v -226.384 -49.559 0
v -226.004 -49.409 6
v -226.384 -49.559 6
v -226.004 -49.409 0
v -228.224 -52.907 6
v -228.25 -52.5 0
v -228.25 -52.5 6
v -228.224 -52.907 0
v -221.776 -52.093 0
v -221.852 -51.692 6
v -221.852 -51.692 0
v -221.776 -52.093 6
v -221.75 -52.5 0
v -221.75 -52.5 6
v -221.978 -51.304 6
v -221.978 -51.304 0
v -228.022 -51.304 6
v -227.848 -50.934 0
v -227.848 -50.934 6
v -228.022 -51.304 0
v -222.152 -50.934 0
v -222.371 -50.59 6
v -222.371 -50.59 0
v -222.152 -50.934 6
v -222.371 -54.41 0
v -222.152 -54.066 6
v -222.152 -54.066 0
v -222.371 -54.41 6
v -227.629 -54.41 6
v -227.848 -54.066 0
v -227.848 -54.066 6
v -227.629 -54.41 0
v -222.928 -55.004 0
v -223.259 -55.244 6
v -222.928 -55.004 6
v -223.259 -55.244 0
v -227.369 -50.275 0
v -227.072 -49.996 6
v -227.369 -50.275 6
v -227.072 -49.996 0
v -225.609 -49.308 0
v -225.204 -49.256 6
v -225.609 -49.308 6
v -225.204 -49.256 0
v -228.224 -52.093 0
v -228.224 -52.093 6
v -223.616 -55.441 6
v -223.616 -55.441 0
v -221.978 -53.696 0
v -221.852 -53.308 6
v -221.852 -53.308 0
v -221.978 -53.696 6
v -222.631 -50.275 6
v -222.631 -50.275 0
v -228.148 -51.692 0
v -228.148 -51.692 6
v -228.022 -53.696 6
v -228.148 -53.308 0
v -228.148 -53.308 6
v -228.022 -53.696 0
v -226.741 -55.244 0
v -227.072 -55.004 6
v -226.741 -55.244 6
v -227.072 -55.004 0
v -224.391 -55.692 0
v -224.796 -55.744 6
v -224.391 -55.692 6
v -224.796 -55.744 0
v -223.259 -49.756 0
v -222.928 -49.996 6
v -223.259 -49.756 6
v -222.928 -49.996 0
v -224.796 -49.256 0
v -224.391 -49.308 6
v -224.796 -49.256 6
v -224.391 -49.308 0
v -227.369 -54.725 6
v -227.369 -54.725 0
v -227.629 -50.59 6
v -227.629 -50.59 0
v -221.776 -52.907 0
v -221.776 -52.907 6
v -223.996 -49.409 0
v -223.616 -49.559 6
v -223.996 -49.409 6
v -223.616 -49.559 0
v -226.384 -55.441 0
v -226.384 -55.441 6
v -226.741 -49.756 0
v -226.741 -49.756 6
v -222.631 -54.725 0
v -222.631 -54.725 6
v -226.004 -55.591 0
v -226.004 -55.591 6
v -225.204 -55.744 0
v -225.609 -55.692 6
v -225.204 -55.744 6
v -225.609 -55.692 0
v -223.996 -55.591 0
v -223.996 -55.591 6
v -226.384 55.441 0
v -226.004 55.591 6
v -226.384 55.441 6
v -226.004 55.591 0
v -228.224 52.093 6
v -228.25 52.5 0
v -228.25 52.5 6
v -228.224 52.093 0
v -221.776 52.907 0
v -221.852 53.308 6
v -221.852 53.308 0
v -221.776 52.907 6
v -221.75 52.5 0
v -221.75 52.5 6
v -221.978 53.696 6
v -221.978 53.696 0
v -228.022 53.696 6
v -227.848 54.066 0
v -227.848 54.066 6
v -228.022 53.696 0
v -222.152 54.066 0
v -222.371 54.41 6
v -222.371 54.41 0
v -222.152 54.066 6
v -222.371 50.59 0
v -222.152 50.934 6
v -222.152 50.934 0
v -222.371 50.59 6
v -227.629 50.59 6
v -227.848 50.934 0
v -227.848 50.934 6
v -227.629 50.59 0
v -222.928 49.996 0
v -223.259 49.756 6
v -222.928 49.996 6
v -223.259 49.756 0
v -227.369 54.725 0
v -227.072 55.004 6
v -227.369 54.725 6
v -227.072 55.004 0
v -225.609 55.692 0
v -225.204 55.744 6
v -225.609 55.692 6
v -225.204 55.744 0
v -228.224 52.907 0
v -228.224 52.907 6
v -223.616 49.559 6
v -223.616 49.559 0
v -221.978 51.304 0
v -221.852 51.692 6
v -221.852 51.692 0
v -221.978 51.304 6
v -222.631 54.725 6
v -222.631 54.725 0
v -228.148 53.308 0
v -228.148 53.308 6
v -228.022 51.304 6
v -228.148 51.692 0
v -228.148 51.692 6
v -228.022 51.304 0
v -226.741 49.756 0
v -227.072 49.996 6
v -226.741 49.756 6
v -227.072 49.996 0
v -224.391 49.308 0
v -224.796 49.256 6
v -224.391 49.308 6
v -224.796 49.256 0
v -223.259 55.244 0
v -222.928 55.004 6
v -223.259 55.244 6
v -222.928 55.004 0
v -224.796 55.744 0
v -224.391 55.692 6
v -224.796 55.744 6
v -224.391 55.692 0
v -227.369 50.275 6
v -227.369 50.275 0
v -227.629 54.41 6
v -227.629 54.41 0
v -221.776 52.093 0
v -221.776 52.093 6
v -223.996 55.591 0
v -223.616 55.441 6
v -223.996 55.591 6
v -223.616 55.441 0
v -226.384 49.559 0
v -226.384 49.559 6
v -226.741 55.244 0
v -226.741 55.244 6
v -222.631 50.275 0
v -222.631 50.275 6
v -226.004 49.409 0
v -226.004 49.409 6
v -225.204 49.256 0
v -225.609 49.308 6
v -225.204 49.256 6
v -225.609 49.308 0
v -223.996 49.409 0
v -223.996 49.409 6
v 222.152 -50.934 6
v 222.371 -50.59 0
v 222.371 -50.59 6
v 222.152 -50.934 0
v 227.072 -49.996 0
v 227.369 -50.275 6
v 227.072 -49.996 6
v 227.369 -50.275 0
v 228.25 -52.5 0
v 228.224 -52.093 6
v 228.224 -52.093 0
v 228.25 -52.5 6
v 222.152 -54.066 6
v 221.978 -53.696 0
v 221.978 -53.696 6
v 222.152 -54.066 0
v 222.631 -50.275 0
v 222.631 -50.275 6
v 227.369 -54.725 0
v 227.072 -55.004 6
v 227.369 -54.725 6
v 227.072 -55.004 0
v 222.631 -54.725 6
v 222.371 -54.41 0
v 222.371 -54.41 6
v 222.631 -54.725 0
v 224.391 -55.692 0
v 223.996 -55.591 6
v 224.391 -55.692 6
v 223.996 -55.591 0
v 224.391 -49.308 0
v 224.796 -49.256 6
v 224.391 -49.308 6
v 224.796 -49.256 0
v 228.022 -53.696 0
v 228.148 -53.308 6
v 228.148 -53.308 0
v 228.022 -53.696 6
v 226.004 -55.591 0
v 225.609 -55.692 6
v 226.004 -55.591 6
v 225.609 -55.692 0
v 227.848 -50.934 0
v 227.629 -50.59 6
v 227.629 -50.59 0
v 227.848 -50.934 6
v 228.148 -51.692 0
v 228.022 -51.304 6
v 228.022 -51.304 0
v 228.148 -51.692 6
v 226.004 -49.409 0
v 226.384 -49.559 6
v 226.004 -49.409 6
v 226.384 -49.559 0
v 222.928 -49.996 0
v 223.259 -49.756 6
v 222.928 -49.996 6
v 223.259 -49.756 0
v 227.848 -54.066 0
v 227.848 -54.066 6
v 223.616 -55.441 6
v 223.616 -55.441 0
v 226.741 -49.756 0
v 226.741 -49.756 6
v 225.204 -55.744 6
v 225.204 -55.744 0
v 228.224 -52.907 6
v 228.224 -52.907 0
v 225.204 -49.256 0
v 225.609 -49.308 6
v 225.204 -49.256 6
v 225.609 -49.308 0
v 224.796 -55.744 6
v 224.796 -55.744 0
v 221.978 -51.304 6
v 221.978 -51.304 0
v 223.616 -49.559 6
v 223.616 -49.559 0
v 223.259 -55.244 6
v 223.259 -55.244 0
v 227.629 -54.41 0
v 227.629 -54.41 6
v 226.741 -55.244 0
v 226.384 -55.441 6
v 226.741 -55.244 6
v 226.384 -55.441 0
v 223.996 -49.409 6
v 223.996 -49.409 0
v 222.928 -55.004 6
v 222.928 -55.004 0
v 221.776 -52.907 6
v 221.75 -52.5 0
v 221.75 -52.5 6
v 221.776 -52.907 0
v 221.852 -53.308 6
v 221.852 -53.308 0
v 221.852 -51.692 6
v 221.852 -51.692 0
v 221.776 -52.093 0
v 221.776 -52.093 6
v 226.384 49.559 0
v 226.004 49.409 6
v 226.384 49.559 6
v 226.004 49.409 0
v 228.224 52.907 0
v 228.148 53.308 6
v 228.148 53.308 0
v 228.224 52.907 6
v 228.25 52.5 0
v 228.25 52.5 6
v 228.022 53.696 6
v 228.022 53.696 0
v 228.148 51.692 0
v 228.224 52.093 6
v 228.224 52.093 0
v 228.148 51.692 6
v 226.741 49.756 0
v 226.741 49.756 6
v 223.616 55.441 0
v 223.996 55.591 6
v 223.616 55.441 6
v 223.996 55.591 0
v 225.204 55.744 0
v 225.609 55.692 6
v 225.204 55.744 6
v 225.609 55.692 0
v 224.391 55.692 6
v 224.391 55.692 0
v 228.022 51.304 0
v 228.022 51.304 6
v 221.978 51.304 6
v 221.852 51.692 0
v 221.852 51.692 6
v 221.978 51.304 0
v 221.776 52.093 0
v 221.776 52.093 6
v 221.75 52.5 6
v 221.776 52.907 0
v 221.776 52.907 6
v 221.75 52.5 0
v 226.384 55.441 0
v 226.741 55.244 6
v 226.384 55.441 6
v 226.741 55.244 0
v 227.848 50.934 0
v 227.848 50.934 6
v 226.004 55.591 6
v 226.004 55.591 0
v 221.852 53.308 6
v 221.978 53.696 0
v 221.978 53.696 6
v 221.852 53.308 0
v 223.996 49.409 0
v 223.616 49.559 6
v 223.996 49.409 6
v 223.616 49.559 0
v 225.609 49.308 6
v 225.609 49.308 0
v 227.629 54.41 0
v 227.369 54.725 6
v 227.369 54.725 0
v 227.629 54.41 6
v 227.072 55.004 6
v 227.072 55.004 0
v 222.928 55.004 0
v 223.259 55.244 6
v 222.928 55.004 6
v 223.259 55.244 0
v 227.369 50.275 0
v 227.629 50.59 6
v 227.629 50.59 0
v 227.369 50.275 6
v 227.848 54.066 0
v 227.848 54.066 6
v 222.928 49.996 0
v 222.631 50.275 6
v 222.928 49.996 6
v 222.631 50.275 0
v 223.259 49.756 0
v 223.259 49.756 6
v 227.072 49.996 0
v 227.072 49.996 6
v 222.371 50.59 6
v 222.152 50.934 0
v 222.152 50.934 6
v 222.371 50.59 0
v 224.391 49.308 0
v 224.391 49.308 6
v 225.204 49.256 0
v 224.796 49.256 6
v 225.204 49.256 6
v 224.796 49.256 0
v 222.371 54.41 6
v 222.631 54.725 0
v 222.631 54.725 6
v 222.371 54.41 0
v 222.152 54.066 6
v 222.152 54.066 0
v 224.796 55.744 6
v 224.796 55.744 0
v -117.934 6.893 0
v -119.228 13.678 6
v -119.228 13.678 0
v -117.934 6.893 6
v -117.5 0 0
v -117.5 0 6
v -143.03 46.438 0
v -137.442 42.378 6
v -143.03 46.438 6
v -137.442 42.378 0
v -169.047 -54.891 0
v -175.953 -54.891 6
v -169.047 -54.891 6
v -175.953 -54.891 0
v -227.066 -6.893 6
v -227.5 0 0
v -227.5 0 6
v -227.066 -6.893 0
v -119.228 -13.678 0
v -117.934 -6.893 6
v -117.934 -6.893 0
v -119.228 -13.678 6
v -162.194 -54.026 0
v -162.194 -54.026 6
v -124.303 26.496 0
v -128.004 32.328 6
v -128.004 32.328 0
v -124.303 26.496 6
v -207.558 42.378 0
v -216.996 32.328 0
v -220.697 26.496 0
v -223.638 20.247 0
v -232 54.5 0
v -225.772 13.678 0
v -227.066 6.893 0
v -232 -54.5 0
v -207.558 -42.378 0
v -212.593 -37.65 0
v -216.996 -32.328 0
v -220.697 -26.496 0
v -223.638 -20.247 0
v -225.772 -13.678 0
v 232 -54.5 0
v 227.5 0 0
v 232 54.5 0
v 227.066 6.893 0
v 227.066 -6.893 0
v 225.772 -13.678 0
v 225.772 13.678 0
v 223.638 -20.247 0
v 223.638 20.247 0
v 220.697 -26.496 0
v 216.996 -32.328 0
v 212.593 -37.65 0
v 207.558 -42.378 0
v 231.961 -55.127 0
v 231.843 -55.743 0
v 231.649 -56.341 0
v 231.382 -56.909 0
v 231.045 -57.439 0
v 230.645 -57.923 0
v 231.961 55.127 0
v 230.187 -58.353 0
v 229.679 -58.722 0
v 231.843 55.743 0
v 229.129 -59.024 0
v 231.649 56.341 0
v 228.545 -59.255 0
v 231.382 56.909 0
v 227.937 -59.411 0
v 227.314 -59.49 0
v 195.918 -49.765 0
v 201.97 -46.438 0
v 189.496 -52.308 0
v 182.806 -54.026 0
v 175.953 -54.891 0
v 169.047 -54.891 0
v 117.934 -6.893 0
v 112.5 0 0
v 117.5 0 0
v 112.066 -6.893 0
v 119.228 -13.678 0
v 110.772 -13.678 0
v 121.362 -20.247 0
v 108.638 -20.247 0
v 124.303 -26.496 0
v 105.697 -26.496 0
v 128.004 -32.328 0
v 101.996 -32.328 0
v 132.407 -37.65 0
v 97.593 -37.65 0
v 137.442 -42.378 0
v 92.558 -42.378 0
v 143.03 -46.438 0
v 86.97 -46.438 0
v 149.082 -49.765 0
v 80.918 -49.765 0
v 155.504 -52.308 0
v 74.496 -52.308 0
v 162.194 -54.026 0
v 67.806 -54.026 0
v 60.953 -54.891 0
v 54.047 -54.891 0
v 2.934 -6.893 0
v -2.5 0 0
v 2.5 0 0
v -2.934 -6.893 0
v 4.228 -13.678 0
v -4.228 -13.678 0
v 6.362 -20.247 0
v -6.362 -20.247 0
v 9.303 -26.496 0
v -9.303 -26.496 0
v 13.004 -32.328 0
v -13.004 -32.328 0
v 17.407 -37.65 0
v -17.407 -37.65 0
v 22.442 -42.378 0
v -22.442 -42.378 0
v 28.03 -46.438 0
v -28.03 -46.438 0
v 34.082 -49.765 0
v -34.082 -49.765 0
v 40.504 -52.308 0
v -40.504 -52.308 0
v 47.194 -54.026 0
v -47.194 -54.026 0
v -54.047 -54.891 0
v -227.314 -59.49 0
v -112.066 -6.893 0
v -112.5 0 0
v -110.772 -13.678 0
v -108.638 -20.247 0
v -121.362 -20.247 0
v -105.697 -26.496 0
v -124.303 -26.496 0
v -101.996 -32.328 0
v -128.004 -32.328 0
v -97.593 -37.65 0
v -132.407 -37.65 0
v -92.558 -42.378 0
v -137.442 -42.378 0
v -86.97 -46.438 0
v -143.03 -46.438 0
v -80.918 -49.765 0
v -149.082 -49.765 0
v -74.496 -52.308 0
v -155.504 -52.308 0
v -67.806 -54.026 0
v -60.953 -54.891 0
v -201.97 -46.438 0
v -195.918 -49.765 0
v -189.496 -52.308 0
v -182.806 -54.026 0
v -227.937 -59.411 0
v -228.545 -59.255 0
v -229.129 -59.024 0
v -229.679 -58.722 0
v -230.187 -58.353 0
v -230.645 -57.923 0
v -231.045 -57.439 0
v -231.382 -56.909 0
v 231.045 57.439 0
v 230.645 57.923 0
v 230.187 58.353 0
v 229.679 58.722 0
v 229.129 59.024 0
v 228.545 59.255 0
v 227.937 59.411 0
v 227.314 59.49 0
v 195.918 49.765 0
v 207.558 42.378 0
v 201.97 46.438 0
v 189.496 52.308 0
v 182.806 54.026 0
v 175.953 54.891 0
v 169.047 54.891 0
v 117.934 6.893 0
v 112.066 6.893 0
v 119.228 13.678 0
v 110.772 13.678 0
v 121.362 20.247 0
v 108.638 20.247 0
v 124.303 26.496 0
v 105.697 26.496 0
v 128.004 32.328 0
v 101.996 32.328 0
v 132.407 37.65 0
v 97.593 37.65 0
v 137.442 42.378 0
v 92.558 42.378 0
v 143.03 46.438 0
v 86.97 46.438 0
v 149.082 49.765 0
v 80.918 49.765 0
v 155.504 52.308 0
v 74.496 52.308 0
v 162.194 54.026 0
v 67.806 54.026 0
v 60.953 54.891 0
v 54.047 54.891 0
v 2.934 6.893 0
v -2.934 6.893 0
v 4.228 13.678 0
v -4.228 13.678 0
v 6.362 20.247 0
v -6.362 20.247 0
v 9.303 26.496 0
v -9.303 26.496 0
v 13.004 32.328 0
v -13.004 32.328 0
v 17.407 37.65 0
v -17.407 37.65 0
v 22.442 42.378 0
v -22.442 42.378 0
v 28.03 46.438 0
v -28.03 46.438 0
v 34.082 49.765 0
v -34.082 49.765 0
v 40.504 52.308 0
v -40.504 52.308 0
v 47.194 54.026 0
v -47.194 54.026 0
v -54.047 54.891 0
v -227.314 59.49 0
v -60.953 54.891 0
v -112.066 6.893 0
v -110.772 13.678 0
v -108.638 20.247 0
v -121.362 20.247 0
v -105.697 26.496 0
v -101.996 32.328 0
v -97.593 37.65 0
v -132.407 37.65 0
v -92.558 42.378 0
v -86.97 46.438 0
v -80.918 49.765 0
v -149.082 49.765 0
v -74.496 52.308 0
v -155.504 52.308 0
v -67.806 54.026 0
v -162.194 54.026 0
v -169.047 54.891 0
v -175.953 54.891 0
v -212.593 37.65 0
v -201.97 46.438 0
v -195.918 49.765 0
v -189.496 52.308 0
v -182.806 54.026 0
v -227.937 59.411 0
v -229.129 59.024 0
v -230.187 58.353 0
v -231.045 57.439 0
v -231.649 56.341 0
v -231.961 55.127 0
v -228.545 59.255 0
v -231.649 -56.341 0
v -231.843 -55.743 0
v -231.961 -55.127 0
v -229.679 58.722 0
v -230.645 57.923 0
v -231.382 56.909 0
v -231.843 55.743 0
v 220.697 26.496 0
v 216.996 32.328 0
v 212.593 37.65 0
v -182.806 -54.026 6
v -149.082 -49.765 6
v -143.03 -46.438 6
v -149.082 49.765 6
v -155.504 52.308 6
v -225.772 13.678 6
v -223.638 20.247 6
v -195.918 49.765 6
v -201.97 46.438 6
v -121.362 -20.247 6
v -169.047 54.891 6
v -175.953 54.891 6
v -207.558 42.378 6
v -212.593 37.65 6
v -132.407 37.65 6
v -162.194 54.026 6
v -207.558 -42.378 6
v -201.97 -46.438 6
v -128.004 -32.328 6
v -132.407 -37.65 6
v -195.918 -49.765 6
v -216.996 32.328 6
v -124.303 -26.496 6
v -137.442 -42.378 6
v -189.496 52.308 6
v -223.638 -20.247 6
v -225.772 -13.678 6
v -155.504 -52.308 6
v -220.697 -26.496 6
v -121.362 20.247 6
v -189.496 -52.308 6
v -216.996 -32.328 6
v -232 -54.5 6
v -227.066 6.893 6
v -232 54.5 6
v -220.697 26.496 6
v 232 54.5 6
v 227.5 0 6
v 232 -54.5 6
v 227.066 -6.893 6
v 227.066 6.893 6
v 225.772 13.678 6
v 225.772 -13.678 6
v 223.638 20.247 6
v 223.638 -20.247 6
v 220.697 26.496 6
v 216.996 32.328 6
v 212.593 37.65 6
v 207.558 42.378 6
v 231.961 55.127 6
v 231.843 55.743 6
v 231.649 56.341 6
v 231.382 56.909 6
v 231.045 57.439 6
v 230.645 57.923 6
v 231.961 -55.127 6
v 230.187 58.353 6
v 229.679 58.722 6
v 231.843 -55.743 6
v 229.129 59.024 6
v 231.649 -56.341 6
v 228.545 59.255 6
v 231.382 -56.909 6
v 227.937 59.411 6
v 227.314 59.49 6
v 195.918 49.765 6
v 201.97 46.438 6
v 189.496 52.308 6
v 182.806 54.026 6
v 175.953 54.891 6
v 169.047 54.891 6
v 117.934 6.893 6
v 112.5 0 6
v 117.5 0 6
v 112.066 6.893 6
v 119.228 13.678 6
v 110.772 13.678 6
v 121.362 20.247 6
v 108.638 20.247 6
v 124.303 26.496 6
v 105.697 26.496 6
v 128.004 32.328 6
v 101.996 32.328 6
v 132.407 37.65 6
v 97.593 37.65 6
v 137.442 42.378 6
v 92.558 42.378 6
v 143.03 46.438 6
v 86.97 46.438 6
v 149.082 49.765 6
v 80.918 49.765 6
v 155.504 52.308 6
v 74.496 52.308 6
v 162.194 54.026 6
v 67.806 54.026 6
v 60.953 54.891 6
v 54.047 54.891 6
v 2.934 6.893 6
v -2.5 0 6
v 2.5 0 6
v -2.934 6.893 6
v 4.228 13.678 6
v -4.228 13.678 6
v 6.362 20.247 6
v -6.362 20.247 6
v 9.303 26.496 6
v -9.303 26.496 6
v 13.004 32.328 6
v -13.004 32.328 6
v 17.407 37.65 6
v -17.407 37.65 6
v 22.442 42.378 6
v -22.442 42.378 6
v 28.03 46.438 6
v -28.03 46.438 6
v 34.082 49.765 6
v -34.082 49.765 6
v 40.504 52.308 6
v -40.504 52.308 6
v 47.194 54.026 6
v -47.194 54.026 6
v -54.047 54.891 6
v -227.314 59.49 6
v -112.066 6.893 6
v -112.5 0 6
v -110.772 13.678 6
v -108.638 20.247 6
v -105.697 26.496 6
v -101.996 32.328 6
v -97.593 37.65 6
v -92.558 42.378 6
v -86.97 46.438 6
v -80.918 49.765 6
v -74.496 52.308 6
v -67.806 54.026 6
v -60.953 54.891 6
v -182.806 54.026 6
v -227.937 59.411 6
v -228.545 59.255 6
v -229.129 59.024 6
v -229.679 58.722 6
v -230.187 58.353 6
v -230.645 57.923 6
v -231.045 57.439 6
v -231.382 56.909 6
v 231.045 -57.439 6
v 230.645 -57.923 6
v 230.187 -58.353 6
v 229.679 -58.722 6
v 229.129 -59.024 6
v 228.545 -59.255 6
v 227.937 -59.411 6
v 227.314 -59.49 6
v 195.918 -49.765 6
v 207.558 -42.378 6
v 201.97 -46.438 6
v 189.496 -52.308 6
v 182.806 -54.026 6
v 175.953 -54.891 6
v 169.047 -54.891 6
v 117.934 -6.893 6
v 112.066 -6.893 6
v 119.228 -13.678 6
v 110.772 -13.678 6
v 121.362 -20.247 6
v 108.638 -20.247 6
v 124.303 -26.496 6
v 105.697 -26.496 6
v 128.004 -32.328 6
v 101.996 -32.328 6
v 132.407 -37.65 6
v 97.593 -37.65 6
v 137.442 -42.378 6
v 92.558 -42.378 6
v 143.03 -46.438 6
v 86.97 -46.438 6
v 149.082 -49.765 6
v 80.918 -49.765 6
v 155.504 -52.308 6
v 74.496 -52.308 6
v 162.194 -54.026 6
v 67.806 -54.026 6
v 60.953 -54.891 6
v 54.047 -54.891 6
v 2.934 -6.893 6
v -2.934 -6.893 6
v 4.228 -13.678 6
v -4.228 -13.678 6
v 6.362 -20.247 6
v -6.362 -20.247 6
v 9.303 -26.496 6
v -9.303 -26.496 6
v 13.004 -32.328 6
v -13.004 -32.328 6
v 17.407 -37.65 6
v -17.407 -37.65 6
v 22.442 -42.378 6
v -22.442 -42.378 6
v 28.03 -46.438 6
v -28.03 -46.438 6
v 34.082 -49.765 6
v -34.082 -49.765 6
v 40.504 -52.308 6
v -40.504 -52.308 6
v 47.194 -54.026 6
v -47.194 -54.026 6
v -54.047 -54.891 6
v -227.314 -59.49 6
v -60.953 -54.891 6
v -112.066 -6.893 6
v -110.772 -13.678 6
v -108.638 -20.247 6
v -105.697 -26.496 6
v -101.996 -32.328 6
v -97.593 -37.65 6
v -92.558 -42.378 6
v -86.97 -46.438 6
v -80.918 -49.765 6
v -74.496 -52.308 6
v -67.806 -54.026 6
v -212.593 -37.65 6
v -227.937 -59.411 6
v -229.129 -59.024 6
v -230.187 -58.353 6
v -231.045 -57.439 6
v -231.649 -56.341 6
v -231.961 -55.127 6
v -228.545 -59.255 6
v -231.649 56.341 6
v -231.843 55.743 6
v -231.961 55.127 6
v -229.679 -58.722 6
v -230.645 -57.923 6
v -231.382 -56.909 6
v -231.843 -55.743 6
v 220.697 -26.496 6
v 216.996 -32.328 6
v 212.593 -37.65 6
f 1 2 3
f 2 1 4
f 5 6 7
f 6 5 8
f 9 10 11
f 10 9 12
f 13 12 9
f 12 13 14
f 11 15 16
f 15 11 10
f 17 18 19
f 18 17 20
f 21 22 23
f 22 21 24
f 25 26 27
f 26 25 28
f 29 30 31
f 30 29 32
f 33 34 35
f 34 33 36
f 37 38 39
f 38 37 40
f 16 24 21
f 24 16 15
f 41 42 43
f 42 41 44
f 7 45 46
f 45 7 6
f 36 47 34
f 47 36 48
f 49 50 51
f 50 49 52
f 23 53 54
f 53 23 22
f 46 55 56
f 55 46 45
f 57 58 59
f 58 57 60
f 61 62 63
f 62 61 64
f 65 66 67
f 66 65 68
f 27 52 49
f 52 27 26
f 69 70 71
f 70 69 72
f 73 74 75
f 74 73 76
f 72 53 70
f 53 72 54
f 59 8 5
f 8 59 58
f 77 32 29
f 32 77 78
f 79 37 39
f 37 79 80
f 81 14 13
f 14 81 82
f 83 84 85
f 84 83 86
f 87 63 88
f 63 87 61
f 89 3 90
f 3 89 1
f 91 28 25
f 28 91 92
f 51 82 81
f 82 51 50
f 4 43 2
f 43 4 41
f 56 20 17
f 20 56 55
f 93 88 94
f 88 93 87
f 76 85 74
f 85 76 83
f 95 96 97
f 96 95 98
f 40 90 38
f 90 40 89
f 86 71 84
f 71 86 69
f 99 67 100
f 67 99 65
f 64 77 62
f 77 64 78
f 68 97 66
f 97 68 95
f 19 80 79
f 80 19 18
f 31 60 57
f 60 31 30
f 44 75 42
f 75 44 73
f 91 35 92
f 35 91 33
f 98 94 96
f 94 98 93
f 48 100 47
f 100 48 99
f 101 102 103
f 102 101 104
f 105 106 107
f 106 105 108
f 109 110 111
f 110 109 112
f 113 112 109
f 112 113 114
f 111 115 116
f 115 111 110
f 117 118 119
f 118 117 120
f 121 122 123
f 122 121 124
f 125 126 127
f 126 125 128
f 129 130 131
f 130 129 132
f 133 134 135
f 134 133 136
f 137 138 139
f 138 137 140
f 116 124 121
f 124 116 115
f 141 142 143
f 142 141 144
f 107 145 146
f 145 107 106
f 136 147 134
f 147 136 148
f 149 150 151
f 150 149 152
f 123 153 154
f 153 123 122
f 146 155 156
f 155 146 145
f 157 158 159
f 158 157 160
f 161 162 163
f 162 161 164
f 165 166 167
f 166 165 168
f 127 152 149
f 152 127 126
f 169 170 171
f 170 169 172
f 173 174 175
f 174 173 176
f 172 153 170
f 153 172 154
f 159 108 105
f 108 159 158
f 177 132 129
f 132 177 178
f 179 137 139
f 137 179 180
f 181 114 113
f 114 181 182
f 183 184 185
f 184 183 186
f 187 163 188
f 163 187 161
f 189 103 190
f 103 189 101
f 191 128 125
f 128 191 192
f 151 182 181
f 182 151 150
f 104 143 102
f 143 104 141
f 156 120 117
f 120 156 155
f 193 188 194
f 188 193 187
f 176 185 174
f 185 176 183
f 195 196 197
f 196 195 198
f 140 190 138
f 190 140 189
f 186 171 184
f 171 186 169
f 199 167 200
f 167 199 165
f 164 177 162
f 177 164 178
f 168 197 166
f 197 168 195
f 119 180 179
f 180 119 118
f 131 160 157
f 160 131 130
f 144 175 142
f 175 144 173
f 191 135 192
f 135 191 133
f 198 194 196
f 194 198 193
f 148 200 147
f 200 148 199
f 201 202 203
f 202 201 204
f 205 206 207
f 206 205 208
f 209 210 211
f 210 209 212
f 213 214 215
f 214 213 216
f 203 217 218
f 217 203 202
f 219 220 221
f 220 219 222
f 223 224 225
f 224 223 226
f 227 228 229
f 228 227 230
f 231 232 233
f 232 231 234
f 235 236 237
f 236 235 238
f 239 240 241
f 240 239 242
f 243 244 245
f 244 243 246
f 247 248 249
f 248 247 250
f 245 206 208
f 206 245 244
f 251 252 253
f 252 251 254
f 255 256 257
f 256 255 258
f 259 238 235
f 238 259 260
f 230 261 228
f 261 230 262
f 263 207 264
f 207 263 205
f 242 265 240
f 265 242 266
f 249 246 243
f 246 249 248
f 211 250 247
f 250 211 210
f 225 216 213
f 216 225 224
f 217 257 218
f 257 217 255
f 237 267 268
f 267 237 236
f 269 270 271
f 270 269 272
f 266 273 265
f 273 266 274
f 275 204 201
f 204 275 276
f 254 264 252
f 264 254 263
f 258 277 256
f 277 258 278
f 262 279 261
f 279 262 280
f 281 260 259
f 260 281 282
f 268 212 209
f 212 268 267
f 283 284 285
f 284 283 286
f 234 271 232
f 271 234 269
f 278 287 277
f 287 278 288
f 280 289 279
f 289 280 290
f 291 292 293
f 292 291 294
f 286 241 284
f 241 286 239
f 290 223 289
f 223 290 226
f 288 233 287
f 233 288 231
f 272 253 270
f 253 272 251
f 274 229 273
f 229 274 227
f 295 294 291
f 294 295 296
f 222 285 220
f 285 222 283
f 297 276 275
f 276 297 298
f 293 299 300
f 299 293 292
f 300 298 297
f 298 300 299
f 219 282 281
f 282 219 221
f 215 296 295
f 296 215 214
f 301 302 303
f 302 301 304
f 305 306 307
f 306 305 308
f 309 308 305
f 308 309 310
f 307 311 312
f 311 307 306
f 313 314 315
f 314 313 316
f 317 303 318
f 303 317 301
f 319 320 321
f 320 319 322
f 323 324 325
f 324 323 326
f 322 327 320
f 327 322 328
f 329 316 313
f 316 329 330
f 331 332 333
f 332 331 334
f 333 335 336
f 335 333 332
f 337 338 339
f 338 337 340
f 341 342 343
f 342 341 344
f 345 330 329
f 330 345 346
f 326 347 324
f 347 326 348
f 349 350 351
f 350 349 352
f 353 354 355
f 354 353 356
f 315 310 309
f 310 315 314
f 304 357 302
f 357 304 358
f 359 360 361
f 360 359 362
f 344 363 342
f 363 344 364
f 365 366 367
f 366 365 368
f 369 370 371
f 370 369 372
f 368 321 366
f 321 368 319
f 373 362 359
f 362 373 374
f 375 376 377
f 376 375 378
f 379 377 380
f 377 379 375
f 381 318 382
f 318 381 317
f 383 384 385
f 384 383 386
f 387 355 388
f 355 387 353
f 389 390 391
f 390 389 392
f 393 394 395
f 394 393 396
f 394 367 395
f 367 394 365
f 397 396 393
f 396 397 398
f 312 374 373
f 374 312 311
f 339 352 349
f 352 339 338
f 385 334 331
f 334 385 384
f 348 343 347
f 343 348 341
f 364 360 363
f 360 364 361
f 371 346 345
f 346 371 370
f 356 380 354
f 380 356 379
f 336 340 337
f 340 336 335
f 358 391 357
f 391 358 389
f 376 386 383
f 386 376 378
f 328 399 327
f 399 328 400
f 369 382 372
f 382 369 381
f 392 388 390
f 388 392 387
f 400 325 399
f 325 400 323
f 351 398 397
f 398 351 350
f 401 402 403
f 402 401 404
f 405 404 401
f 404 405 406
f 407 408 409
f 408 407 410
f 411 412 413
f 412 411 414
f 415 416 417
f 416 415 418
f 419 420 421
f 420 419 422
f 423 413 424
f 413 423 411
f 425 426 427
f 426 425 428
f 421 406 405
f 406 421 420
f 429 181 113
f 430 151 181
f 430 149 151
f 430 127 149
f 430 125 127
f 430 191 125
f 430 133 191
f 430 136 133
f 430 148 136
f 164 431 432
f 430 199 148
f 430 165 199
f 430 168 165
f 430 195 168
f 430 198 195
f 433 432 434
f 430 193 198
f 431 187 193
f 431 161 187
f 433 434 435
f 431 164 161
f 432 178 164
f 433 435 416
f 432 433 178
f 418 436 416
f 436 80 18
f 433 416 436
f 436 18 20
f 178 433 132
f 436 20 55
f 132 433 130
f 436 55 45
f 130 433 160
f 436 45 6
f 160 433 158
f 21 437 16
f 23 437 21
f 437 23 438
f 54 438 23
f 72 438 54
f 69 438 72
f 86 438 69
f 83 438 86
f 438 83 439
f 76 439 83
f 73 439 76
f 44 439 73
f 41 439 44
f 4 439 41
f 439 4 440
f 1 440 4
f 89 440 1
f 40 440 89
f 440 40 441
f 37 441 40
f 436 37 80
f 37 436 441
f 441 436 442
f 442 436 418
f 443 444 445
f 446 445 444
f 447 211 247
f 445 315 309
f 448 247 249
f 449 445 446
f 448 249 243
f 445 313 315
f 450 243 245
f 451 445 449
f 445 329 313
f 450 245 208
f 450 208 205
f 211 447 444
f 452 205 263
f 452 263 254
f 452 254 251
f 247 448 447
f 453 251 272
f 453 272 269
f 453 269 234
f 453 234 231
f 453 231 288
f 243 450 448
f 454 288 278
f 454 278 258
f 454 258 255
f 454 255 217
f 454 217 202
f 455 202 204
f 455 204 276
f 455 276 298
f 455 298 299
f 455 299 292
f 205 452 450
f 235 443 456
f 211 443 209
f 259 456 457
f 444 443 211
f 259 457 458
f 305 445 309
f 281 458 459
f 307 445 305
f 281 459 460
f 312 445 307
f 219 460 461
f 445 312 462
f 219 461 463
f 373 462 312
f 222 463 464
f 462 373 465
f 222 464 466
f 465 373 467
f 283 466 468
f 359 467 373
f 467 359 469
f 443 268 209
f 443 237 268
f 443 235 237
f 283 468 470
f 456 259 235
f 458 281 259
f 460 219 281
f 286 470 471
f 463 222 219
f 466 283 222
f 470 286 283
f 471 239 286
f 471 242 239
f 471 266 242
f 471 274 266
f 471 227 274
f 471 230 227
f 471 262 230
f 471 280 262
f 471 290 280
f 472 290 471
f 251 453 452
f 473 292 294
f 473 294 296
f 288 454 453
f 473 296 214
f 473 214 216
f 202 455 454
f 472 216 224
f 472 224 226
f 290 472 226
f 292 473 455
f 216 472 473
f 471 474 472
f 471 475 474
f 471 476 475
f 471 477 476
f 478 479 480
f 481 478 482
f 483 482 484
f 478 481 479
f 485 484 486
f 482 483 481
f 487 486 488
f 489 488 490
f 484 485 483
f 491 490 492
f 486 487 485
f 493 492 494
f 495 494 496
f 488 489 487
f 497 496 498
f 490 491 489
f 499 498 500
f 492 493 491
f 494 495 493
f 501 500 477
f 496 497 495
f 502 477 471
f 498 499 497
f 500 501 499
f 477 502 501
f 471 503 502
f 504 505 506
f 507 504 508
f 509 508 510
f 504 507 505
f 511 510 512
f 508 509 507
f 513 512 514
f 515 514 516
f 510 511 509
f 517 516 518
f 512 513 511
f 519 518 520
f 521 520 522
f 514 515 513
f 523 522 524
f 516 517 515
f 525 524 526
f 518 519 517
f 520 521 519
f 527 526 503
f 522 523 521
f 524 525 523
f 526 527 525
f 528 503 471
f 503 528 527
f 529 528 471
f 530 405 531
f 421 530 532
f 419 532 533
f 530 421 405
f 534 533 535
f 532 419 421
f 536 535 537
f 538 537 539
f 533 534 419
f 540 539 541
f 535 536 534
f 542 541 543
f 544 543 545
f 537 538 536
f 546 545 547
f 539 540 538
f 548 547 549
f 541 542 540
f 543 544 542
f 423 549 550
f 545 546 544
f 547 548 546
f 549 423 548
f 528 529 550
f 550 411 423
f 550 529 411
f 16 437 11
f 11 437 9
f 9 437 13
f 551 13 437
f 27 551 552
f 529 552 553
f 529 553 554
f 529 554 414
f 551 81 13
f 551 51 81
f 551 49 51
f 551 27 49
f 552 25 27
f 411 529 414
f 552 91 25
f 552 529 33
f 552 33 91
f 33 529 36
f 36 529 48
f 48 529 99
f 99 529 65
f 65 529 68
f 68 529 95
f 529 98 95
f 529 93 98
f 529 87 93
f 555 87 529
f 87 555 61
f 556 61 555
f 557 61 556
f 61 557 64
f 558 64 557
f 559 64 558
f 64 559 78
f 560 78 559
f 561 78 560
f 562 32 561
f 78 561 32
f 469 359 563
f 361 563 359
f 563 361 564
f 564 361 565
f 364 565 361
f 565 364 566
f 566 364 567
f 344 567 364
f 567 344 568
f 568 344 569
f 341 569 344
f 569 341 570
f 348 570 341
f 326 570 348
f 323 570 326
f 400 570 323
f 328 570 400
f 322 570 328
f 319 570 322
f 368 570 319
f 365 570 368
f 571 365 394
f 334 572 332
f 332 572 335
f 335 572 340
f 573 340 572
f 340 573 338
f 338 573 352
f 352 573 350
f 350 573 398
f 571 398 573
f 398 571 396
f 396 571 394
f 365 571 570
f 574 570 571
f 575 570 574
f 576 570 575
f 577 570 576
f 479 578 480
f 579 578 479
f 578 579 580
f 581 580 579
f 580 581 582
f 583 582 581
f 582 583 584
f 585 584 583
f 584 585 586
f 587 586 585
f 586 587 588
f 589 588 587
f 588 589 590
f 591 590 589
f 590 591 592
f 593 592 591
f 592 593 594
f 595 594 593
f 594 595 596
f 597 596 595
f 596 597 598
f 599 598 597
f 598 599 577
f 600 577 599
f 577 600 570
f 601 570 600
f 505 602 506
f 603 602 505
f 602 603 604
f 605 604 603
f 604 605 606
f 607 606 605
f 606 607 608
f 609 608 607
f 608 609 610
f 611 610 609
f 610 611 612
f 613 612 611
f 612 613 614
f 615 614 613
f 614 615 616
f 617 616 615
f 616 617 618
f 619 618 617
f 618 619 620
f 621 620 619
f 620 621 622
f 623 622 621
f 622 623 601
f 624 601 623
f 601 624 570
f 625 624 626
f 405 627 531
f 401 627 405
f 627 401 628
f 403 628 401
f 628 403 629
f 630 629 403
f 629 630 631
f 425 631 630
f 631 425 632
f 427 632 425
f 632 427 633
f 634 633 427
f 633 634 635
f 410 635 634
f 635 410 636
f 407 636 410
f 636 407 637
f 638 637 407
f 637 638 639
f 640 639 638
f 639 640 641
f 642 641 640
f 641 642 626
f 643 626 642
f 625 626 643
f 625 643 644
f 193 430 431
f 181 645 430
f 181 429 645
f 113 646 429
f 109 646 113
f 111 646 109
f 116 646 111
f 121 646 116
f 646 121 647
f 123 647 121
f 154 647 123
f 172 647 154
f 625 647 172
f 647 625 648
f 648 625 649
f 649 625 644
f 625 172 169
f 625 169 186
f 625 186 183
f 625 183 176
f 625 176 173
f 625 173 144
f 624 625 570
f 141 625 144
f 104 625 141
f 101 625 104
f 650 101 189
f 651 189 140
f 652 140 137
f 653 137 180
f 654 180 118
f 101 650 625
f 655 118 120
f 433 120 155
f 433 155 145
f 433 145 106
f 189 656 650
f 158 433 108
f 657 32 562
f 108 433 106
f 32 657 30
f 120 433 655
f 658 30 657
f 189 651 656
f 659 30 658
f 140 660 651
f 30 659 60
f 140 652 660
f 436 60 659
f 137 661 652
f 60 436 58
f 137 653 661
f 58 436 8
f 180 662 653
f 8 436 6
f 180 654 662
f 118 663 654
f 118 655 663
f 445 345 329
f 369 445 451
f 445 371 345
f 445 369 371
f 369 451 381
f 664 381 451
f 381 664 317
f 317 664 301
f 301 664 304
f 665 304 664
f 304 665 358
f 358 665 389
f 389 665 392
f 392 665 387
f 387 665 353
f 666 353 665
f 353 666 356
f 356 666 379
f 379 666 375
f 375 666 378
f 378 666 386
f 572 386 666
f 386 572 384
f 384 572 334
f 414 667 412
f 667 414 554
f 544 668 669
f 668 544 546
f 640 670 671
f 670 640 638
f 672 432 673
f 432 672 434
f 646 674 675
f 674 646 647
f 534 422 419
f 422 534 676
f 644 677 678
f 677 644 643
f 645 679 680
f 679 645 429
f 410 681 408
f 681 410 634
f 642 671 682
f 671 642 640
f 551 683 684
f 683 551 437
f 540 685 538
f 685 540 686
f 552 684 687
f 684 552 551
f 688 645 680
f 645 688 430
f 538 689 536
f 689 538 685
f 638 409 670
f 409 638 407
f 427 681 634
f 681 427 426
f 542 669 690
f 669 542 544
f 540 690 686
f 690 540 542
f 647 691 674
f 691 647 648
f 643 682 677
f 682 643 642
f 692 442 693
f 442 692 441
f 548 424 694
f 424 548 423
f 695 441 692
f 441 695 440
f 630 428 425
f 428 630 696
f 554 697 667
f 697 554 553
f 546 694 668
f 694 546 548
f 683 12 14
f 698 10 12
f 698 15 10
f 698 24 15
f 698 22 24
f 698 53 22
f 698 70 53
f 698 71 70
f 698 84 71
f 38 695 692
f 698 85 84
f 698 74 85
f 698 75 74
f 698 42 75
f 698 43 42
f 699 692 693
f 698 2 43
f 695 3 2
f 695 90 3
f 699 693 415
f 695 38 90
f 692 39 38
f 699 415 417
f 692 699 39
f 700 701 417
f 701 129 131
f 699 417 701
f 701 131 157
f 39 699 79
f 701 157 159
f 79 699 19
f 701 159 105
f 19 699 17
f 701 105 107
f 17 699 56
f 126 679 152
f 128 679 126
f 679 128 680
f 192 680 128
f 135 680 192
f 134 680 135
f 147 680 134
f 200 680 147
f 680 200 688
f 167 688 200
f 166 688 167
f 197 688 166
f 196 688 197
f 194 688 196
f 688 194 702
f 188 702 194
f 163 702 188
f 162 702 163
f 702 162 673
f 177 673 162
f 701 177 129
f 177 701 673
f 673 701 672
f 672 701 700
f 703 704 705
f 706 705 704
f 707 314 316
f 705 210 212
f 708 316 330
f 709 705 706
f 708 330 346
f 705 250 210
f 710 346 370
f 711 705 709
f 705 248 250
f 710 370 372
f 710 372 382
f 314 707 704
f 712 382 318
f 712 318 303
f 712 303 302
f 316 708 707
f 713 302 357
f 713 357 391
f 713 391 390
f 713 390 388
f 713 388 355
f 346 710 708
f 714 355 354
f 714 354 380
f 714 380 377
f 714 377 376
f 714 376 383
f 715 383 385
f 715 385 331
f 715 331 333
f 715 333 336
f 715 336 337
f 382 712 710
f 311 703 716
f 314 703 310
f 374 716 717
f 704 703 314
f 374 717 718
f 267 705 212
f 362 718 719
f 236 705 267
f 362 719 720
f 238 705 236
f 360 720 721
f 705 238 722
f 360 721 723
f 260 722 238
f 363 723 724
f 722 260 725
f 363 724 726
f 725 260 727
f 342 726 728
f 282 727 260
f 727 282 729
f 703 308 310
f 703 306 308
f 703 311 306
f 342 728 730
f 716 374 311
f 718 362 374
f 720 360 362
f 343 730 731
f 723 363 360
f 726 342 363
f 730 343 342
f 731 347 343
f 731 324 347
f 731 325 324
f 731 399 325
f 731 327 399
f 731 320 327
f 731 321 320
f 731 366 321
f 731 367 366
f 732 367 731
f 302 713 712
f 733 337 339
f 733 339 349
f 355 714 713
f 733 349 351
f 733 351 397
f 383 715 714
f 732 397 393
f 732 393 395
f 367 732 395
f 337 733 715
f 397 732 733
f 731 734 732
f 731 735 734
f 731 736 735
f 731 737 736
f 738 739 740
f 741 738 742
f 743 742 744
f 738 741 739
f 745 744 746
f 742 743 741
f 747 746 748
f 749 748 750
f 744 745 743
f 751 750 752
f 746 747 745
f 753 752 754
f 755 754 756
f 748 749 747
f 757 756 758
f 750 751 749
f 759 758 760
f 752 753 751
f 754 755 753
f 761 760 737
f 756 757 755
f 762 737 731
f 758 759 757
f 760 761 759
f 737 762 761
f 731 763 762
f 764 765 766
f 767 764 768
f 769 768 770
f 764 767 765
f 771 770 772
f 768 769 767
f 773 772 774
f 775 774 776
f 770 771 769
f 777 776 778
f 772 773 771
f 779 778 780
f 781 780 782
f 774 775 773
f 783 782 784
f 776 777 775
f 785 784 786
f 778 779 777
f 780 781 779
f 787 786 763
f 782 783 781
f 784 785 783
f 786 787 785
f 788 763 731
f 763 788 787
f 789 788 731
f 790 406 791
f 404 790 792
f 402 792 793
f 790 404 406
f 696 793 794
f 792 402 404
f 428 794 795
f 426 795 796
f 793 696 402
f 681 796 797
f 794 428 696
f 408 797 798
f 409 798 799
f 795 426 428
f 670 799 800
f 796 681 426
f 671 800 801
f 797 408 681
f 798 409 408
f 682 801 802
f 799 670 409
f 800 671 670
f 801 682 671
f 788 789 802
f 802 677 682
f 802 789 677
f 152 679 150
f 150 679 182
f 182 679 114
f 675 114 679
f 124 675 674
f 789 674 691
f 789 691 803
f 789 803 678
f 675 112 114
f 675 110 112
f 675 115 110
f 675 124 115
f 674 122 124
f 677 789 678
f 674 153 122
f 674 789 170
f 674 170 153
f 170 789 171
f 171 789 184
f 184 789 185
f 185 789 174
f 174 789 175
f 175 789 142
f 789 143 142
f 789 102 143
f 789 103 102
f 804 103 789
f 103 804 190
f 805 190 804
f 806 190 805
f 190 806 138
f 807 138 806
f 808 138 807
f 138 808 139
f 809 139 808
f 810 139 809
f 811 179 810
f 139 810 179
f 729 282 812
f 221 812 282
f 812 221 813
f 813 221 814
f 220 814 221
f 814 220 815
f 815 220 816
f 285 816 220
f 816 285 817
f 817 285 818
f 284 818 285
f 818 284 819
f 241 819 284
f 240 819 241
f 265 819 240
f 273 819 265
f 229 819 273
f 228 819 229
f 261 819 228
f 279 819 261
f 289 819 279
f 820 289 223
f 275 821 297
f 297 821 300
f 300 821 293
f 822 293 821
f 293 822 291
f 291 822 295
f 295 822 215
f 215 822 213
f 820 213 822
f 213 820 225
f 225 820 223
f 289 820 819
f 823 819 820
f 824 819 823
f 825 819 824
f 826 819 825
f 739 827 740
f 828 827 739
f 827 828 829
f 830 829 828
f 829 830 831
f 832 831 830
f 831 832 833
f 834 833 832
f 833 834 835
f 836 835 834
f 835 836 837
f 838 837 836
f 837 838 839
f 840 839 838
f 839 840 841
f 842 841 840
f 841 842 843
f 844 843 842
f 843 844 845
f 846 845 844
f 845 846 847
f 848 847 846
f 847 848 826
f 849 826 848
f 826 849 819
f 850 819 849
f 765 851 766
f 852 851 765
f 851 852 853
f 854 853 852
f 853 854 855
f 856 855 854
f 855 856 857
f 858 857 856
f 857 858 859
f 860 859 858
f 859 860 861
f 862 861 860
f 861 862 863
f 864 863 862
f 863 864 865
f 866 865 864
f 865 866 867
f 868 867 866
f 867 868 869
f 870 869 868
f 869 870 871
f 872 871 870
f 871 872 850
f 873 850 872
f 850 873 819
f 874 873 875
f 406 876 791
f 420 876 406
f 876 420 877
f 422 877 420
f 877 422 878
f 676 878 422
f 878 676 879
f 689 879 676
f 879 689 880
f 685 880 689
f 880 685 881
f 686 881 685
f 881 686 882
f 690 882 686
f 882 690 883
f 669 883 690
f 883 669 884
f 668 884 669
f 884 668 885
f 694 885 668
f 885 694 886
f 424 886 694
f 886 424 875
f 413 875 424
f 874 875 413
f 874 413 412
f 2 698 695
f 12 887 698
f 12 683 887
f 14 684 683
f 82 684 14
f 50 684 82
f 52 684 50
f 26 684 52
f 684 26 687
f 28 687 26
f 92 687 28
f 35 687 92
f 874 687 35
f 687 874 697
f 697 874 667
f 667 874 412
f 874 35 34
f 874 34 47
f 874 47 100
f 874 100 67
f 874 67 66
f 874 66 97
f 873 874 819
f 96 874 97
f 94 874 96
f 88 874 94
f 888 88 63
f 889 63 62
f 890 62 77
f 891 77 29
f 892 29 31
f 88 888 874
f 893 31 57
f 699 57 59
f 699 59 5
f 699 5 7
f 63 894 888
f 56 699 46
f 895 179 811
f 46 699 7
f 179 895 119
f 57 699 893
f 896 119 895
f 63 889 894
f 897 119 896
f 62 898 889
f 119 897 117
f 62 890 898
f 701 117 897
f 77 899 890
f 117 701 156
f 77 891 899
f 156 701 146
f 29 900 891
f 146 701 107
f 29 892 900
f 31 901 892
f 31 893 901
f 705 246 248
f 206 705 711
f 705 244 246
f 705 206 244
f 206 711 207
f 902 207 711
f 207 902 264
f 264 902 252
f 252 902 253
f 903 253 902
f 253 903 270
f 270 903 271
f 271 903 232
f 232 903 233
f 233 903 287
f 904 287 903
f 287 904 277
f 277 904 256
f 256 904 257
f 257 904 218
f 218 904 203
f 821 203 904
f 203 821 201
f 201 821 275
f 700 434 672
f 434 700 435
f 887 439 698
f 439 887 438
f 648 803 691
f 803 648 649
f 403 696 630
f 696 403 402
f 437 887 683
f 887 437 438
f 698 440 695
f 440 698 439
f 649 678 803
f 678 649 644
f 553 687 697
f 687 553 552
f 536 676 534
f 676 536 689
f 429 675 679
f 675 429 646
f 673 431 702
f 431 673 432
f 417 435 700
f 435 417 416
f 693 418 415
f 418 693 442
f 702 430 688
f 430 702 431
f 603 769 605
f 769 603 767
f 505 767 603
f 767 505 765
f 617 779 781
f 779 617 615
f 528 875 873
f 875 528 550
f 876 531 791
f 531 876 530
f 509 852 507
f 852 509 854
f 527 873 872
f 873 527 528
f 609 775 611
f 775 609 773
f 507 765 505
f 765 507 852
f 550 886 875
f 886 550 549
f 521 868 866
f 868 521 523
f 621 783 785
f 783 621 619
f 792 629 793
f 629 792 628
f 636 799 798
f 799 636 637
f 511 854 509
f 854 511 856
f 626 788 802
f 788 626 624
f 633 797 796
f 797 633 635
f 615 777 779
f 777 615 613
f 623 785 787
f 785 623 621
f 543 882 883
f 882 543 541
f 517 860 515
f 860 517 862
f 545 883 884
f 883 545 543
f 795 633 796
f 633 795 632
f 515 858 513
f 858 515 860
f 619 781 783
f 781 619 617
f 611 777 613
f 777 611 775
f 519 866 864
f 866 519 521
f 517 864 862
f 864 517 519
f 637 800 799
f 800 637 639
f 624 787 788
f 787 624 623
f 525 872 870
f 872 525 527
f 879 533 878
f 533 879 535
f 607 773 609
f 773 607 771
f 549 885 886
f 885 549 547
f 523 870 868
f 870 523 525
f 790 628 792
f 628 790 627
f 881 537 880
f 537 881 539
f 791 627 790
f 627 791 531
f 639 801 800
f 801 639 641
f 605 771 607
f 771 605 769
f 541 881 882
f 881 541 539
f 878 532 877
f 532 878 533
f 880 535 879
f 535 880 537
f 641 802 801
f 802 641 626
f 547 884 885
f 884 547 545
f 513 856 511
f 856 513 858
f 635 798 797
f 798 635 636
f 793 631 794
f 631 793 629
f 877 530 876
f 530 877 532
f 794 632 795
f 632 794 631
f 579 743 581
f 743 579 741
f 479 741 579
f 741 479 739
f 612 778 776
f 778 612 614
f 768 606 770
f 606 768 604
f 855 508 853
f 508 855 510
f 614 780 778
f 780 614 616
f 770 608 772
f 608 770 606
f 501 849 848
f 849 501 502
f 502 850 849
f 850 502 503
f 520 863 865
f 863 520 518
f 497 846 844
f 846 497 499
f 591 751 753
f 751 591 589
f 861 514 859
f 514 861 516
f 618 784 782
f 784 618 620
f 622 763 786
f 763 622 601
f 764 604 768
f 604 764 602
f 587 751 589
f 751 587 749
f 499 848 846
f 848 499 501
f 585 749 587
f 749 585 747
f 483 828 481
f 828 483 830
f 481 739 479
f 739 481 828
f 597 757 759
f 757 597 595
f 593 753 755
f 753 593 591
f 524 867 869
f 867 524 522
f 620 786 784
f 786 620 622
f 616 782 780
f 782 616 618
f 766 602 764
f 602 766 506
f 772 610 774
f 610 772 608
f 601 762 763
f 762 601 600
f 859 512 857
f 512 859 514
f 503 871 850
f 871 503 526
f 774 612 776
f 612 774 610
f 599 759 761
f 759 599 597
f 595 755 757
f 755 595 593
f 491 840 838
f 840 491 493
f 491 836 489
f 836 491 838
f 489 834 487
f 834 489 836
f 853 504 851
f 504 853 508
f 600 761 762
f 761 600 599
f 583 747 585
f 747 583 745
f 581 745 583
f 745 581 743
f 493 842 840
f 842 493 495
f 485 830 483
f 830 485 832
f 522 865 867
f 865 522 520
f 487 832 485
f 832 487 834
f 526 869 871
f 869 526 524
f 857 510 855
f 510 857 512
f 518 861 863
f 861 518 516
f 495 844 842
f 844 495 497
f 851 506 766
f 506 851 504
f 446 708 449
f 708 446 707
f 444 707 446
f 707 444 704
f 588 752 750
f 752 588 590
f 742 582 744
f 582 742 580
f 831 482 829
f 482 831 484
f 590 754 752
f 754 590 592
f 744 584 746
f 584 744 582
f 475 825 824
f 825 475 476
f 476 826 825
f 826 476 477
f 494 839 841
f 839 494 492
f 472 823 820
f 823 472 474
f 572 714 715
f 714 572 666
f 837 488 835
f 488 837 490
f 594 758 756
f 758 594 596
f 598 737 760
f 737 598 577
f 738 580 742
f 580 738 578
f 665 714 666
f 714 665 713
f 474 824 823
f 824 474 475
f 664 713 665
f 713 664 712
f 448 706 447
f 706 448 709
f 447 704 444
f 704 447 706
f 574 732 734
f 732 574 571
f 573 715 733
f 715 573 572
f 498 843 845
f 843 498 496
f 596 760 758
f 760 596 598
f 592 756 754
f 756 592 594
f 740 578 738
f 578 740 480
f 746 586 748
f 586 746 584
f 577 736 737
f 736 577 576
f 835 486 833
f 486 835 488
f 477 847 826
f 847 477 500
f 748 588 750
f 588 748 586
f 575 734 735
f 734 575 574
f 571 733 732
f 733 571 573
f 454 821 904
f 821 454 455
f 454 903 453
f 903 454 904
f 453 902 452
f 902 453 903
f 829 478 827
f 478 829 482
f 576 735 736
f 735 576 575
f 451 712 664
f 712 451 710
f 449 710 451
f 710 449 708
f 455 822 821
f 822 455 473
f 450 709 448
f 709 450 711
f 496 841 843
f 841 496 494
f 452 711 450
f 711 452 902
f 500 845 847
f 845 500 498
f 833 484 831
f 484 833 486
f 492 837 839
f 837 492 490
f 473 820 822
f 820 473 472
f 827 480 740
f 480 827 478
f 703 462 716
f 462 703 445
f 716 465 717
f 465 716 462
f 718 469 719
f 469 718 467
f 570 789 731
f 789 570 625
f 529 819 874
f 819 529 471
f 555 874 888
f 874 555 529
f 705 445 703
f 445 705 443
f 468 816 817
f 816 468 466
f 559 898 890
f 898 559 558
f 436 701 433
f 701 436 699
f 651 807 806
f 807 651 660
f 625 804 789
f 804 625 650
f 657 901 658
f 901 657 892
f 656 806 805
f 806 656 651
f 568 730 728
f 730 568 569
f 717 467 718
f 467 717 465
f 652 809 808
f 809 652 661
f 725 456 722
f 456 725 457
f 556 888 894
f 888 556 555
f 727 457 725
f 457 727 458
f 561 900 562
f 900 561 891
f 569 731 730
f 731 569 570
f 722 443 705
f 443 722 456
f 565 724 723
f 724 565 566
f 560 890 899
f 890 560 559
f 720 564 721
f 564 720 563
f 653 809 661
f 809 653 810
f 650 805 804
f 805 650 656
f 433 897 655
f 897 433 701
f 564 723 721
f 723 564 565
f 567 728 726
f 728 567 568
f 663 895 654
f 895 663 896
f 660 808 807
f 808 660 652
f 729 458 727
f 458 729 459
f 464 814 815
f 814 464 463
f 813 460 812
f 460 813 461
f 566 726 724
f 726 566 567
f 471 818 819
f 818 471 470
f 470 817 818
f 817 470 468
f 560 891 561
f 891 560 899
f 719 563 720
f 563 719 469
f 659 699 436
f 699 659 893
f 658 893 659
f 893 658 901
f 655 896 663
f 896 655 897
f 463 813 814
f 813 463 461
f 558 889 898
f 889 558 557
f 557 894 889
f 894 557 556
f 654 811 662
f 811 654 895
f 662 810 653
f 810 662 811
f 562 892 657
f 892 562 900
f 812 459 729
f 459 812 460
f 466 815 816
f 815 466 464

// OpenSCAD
$fn = 50;


difference() {
	union() {
		hull() {
			translate(v = [-227.0000000000, 54.5000000000, 0]) {
				cylinder(h = 6, r = 5);
			}
			translate(v = [227.0000000000, 54.5000000000, 0]) {
				cylinder(h = 6, r = 5);
			}
			translate(v = [-227.0000000000, -54.5000000000, 0]) {
				cylinder(h = 6, r = 5);
			}
			translate(v = [227.0000000000, -54.5000000000, 0]) {
				cylinder(h = 6, r = 5);
			}
		}
	}
	union() {
		#translate(v = [-225.0000000000, -52.5000000000, -100.0000000000]) {
			cylinder(h = 200, r = 3.2500000000);
		}
		#translate(v = [-225.0000000000, 52.5000000000, -100.0000000000]) {
			cylinder(h = 200, r = 3.2500000000);
		}
		#translate(v = [225.0000000000, -52.5000000000, -100.0000000000]) {
			cylinder(h = 200, r = 3.2500000000);
		}
		#translate(v = [225.0000000000, 52.5000000000, -100.0000000000]) {
			cylinder(h = 200, r = 3.2500000000);
		}
		#translate(v = [-172.5000000000, 0, 0]) {
			cylinder(h = 6, r = 55.0000000000);
		}
		#translate(v = [-57.5000000000, 0, 0]) {
			cylinder(h = 6, r = 55.0000000000);
		}
		#translate(v = [57.5000000000, 0, 0]) {
			cylinder(h = 6, r = 55.0000000000);
		}
		#translate(v = [172.5000000000, 0, 0]) {
			cylinder(h = 6, r = 55.0000000000);
		}
	}
}
